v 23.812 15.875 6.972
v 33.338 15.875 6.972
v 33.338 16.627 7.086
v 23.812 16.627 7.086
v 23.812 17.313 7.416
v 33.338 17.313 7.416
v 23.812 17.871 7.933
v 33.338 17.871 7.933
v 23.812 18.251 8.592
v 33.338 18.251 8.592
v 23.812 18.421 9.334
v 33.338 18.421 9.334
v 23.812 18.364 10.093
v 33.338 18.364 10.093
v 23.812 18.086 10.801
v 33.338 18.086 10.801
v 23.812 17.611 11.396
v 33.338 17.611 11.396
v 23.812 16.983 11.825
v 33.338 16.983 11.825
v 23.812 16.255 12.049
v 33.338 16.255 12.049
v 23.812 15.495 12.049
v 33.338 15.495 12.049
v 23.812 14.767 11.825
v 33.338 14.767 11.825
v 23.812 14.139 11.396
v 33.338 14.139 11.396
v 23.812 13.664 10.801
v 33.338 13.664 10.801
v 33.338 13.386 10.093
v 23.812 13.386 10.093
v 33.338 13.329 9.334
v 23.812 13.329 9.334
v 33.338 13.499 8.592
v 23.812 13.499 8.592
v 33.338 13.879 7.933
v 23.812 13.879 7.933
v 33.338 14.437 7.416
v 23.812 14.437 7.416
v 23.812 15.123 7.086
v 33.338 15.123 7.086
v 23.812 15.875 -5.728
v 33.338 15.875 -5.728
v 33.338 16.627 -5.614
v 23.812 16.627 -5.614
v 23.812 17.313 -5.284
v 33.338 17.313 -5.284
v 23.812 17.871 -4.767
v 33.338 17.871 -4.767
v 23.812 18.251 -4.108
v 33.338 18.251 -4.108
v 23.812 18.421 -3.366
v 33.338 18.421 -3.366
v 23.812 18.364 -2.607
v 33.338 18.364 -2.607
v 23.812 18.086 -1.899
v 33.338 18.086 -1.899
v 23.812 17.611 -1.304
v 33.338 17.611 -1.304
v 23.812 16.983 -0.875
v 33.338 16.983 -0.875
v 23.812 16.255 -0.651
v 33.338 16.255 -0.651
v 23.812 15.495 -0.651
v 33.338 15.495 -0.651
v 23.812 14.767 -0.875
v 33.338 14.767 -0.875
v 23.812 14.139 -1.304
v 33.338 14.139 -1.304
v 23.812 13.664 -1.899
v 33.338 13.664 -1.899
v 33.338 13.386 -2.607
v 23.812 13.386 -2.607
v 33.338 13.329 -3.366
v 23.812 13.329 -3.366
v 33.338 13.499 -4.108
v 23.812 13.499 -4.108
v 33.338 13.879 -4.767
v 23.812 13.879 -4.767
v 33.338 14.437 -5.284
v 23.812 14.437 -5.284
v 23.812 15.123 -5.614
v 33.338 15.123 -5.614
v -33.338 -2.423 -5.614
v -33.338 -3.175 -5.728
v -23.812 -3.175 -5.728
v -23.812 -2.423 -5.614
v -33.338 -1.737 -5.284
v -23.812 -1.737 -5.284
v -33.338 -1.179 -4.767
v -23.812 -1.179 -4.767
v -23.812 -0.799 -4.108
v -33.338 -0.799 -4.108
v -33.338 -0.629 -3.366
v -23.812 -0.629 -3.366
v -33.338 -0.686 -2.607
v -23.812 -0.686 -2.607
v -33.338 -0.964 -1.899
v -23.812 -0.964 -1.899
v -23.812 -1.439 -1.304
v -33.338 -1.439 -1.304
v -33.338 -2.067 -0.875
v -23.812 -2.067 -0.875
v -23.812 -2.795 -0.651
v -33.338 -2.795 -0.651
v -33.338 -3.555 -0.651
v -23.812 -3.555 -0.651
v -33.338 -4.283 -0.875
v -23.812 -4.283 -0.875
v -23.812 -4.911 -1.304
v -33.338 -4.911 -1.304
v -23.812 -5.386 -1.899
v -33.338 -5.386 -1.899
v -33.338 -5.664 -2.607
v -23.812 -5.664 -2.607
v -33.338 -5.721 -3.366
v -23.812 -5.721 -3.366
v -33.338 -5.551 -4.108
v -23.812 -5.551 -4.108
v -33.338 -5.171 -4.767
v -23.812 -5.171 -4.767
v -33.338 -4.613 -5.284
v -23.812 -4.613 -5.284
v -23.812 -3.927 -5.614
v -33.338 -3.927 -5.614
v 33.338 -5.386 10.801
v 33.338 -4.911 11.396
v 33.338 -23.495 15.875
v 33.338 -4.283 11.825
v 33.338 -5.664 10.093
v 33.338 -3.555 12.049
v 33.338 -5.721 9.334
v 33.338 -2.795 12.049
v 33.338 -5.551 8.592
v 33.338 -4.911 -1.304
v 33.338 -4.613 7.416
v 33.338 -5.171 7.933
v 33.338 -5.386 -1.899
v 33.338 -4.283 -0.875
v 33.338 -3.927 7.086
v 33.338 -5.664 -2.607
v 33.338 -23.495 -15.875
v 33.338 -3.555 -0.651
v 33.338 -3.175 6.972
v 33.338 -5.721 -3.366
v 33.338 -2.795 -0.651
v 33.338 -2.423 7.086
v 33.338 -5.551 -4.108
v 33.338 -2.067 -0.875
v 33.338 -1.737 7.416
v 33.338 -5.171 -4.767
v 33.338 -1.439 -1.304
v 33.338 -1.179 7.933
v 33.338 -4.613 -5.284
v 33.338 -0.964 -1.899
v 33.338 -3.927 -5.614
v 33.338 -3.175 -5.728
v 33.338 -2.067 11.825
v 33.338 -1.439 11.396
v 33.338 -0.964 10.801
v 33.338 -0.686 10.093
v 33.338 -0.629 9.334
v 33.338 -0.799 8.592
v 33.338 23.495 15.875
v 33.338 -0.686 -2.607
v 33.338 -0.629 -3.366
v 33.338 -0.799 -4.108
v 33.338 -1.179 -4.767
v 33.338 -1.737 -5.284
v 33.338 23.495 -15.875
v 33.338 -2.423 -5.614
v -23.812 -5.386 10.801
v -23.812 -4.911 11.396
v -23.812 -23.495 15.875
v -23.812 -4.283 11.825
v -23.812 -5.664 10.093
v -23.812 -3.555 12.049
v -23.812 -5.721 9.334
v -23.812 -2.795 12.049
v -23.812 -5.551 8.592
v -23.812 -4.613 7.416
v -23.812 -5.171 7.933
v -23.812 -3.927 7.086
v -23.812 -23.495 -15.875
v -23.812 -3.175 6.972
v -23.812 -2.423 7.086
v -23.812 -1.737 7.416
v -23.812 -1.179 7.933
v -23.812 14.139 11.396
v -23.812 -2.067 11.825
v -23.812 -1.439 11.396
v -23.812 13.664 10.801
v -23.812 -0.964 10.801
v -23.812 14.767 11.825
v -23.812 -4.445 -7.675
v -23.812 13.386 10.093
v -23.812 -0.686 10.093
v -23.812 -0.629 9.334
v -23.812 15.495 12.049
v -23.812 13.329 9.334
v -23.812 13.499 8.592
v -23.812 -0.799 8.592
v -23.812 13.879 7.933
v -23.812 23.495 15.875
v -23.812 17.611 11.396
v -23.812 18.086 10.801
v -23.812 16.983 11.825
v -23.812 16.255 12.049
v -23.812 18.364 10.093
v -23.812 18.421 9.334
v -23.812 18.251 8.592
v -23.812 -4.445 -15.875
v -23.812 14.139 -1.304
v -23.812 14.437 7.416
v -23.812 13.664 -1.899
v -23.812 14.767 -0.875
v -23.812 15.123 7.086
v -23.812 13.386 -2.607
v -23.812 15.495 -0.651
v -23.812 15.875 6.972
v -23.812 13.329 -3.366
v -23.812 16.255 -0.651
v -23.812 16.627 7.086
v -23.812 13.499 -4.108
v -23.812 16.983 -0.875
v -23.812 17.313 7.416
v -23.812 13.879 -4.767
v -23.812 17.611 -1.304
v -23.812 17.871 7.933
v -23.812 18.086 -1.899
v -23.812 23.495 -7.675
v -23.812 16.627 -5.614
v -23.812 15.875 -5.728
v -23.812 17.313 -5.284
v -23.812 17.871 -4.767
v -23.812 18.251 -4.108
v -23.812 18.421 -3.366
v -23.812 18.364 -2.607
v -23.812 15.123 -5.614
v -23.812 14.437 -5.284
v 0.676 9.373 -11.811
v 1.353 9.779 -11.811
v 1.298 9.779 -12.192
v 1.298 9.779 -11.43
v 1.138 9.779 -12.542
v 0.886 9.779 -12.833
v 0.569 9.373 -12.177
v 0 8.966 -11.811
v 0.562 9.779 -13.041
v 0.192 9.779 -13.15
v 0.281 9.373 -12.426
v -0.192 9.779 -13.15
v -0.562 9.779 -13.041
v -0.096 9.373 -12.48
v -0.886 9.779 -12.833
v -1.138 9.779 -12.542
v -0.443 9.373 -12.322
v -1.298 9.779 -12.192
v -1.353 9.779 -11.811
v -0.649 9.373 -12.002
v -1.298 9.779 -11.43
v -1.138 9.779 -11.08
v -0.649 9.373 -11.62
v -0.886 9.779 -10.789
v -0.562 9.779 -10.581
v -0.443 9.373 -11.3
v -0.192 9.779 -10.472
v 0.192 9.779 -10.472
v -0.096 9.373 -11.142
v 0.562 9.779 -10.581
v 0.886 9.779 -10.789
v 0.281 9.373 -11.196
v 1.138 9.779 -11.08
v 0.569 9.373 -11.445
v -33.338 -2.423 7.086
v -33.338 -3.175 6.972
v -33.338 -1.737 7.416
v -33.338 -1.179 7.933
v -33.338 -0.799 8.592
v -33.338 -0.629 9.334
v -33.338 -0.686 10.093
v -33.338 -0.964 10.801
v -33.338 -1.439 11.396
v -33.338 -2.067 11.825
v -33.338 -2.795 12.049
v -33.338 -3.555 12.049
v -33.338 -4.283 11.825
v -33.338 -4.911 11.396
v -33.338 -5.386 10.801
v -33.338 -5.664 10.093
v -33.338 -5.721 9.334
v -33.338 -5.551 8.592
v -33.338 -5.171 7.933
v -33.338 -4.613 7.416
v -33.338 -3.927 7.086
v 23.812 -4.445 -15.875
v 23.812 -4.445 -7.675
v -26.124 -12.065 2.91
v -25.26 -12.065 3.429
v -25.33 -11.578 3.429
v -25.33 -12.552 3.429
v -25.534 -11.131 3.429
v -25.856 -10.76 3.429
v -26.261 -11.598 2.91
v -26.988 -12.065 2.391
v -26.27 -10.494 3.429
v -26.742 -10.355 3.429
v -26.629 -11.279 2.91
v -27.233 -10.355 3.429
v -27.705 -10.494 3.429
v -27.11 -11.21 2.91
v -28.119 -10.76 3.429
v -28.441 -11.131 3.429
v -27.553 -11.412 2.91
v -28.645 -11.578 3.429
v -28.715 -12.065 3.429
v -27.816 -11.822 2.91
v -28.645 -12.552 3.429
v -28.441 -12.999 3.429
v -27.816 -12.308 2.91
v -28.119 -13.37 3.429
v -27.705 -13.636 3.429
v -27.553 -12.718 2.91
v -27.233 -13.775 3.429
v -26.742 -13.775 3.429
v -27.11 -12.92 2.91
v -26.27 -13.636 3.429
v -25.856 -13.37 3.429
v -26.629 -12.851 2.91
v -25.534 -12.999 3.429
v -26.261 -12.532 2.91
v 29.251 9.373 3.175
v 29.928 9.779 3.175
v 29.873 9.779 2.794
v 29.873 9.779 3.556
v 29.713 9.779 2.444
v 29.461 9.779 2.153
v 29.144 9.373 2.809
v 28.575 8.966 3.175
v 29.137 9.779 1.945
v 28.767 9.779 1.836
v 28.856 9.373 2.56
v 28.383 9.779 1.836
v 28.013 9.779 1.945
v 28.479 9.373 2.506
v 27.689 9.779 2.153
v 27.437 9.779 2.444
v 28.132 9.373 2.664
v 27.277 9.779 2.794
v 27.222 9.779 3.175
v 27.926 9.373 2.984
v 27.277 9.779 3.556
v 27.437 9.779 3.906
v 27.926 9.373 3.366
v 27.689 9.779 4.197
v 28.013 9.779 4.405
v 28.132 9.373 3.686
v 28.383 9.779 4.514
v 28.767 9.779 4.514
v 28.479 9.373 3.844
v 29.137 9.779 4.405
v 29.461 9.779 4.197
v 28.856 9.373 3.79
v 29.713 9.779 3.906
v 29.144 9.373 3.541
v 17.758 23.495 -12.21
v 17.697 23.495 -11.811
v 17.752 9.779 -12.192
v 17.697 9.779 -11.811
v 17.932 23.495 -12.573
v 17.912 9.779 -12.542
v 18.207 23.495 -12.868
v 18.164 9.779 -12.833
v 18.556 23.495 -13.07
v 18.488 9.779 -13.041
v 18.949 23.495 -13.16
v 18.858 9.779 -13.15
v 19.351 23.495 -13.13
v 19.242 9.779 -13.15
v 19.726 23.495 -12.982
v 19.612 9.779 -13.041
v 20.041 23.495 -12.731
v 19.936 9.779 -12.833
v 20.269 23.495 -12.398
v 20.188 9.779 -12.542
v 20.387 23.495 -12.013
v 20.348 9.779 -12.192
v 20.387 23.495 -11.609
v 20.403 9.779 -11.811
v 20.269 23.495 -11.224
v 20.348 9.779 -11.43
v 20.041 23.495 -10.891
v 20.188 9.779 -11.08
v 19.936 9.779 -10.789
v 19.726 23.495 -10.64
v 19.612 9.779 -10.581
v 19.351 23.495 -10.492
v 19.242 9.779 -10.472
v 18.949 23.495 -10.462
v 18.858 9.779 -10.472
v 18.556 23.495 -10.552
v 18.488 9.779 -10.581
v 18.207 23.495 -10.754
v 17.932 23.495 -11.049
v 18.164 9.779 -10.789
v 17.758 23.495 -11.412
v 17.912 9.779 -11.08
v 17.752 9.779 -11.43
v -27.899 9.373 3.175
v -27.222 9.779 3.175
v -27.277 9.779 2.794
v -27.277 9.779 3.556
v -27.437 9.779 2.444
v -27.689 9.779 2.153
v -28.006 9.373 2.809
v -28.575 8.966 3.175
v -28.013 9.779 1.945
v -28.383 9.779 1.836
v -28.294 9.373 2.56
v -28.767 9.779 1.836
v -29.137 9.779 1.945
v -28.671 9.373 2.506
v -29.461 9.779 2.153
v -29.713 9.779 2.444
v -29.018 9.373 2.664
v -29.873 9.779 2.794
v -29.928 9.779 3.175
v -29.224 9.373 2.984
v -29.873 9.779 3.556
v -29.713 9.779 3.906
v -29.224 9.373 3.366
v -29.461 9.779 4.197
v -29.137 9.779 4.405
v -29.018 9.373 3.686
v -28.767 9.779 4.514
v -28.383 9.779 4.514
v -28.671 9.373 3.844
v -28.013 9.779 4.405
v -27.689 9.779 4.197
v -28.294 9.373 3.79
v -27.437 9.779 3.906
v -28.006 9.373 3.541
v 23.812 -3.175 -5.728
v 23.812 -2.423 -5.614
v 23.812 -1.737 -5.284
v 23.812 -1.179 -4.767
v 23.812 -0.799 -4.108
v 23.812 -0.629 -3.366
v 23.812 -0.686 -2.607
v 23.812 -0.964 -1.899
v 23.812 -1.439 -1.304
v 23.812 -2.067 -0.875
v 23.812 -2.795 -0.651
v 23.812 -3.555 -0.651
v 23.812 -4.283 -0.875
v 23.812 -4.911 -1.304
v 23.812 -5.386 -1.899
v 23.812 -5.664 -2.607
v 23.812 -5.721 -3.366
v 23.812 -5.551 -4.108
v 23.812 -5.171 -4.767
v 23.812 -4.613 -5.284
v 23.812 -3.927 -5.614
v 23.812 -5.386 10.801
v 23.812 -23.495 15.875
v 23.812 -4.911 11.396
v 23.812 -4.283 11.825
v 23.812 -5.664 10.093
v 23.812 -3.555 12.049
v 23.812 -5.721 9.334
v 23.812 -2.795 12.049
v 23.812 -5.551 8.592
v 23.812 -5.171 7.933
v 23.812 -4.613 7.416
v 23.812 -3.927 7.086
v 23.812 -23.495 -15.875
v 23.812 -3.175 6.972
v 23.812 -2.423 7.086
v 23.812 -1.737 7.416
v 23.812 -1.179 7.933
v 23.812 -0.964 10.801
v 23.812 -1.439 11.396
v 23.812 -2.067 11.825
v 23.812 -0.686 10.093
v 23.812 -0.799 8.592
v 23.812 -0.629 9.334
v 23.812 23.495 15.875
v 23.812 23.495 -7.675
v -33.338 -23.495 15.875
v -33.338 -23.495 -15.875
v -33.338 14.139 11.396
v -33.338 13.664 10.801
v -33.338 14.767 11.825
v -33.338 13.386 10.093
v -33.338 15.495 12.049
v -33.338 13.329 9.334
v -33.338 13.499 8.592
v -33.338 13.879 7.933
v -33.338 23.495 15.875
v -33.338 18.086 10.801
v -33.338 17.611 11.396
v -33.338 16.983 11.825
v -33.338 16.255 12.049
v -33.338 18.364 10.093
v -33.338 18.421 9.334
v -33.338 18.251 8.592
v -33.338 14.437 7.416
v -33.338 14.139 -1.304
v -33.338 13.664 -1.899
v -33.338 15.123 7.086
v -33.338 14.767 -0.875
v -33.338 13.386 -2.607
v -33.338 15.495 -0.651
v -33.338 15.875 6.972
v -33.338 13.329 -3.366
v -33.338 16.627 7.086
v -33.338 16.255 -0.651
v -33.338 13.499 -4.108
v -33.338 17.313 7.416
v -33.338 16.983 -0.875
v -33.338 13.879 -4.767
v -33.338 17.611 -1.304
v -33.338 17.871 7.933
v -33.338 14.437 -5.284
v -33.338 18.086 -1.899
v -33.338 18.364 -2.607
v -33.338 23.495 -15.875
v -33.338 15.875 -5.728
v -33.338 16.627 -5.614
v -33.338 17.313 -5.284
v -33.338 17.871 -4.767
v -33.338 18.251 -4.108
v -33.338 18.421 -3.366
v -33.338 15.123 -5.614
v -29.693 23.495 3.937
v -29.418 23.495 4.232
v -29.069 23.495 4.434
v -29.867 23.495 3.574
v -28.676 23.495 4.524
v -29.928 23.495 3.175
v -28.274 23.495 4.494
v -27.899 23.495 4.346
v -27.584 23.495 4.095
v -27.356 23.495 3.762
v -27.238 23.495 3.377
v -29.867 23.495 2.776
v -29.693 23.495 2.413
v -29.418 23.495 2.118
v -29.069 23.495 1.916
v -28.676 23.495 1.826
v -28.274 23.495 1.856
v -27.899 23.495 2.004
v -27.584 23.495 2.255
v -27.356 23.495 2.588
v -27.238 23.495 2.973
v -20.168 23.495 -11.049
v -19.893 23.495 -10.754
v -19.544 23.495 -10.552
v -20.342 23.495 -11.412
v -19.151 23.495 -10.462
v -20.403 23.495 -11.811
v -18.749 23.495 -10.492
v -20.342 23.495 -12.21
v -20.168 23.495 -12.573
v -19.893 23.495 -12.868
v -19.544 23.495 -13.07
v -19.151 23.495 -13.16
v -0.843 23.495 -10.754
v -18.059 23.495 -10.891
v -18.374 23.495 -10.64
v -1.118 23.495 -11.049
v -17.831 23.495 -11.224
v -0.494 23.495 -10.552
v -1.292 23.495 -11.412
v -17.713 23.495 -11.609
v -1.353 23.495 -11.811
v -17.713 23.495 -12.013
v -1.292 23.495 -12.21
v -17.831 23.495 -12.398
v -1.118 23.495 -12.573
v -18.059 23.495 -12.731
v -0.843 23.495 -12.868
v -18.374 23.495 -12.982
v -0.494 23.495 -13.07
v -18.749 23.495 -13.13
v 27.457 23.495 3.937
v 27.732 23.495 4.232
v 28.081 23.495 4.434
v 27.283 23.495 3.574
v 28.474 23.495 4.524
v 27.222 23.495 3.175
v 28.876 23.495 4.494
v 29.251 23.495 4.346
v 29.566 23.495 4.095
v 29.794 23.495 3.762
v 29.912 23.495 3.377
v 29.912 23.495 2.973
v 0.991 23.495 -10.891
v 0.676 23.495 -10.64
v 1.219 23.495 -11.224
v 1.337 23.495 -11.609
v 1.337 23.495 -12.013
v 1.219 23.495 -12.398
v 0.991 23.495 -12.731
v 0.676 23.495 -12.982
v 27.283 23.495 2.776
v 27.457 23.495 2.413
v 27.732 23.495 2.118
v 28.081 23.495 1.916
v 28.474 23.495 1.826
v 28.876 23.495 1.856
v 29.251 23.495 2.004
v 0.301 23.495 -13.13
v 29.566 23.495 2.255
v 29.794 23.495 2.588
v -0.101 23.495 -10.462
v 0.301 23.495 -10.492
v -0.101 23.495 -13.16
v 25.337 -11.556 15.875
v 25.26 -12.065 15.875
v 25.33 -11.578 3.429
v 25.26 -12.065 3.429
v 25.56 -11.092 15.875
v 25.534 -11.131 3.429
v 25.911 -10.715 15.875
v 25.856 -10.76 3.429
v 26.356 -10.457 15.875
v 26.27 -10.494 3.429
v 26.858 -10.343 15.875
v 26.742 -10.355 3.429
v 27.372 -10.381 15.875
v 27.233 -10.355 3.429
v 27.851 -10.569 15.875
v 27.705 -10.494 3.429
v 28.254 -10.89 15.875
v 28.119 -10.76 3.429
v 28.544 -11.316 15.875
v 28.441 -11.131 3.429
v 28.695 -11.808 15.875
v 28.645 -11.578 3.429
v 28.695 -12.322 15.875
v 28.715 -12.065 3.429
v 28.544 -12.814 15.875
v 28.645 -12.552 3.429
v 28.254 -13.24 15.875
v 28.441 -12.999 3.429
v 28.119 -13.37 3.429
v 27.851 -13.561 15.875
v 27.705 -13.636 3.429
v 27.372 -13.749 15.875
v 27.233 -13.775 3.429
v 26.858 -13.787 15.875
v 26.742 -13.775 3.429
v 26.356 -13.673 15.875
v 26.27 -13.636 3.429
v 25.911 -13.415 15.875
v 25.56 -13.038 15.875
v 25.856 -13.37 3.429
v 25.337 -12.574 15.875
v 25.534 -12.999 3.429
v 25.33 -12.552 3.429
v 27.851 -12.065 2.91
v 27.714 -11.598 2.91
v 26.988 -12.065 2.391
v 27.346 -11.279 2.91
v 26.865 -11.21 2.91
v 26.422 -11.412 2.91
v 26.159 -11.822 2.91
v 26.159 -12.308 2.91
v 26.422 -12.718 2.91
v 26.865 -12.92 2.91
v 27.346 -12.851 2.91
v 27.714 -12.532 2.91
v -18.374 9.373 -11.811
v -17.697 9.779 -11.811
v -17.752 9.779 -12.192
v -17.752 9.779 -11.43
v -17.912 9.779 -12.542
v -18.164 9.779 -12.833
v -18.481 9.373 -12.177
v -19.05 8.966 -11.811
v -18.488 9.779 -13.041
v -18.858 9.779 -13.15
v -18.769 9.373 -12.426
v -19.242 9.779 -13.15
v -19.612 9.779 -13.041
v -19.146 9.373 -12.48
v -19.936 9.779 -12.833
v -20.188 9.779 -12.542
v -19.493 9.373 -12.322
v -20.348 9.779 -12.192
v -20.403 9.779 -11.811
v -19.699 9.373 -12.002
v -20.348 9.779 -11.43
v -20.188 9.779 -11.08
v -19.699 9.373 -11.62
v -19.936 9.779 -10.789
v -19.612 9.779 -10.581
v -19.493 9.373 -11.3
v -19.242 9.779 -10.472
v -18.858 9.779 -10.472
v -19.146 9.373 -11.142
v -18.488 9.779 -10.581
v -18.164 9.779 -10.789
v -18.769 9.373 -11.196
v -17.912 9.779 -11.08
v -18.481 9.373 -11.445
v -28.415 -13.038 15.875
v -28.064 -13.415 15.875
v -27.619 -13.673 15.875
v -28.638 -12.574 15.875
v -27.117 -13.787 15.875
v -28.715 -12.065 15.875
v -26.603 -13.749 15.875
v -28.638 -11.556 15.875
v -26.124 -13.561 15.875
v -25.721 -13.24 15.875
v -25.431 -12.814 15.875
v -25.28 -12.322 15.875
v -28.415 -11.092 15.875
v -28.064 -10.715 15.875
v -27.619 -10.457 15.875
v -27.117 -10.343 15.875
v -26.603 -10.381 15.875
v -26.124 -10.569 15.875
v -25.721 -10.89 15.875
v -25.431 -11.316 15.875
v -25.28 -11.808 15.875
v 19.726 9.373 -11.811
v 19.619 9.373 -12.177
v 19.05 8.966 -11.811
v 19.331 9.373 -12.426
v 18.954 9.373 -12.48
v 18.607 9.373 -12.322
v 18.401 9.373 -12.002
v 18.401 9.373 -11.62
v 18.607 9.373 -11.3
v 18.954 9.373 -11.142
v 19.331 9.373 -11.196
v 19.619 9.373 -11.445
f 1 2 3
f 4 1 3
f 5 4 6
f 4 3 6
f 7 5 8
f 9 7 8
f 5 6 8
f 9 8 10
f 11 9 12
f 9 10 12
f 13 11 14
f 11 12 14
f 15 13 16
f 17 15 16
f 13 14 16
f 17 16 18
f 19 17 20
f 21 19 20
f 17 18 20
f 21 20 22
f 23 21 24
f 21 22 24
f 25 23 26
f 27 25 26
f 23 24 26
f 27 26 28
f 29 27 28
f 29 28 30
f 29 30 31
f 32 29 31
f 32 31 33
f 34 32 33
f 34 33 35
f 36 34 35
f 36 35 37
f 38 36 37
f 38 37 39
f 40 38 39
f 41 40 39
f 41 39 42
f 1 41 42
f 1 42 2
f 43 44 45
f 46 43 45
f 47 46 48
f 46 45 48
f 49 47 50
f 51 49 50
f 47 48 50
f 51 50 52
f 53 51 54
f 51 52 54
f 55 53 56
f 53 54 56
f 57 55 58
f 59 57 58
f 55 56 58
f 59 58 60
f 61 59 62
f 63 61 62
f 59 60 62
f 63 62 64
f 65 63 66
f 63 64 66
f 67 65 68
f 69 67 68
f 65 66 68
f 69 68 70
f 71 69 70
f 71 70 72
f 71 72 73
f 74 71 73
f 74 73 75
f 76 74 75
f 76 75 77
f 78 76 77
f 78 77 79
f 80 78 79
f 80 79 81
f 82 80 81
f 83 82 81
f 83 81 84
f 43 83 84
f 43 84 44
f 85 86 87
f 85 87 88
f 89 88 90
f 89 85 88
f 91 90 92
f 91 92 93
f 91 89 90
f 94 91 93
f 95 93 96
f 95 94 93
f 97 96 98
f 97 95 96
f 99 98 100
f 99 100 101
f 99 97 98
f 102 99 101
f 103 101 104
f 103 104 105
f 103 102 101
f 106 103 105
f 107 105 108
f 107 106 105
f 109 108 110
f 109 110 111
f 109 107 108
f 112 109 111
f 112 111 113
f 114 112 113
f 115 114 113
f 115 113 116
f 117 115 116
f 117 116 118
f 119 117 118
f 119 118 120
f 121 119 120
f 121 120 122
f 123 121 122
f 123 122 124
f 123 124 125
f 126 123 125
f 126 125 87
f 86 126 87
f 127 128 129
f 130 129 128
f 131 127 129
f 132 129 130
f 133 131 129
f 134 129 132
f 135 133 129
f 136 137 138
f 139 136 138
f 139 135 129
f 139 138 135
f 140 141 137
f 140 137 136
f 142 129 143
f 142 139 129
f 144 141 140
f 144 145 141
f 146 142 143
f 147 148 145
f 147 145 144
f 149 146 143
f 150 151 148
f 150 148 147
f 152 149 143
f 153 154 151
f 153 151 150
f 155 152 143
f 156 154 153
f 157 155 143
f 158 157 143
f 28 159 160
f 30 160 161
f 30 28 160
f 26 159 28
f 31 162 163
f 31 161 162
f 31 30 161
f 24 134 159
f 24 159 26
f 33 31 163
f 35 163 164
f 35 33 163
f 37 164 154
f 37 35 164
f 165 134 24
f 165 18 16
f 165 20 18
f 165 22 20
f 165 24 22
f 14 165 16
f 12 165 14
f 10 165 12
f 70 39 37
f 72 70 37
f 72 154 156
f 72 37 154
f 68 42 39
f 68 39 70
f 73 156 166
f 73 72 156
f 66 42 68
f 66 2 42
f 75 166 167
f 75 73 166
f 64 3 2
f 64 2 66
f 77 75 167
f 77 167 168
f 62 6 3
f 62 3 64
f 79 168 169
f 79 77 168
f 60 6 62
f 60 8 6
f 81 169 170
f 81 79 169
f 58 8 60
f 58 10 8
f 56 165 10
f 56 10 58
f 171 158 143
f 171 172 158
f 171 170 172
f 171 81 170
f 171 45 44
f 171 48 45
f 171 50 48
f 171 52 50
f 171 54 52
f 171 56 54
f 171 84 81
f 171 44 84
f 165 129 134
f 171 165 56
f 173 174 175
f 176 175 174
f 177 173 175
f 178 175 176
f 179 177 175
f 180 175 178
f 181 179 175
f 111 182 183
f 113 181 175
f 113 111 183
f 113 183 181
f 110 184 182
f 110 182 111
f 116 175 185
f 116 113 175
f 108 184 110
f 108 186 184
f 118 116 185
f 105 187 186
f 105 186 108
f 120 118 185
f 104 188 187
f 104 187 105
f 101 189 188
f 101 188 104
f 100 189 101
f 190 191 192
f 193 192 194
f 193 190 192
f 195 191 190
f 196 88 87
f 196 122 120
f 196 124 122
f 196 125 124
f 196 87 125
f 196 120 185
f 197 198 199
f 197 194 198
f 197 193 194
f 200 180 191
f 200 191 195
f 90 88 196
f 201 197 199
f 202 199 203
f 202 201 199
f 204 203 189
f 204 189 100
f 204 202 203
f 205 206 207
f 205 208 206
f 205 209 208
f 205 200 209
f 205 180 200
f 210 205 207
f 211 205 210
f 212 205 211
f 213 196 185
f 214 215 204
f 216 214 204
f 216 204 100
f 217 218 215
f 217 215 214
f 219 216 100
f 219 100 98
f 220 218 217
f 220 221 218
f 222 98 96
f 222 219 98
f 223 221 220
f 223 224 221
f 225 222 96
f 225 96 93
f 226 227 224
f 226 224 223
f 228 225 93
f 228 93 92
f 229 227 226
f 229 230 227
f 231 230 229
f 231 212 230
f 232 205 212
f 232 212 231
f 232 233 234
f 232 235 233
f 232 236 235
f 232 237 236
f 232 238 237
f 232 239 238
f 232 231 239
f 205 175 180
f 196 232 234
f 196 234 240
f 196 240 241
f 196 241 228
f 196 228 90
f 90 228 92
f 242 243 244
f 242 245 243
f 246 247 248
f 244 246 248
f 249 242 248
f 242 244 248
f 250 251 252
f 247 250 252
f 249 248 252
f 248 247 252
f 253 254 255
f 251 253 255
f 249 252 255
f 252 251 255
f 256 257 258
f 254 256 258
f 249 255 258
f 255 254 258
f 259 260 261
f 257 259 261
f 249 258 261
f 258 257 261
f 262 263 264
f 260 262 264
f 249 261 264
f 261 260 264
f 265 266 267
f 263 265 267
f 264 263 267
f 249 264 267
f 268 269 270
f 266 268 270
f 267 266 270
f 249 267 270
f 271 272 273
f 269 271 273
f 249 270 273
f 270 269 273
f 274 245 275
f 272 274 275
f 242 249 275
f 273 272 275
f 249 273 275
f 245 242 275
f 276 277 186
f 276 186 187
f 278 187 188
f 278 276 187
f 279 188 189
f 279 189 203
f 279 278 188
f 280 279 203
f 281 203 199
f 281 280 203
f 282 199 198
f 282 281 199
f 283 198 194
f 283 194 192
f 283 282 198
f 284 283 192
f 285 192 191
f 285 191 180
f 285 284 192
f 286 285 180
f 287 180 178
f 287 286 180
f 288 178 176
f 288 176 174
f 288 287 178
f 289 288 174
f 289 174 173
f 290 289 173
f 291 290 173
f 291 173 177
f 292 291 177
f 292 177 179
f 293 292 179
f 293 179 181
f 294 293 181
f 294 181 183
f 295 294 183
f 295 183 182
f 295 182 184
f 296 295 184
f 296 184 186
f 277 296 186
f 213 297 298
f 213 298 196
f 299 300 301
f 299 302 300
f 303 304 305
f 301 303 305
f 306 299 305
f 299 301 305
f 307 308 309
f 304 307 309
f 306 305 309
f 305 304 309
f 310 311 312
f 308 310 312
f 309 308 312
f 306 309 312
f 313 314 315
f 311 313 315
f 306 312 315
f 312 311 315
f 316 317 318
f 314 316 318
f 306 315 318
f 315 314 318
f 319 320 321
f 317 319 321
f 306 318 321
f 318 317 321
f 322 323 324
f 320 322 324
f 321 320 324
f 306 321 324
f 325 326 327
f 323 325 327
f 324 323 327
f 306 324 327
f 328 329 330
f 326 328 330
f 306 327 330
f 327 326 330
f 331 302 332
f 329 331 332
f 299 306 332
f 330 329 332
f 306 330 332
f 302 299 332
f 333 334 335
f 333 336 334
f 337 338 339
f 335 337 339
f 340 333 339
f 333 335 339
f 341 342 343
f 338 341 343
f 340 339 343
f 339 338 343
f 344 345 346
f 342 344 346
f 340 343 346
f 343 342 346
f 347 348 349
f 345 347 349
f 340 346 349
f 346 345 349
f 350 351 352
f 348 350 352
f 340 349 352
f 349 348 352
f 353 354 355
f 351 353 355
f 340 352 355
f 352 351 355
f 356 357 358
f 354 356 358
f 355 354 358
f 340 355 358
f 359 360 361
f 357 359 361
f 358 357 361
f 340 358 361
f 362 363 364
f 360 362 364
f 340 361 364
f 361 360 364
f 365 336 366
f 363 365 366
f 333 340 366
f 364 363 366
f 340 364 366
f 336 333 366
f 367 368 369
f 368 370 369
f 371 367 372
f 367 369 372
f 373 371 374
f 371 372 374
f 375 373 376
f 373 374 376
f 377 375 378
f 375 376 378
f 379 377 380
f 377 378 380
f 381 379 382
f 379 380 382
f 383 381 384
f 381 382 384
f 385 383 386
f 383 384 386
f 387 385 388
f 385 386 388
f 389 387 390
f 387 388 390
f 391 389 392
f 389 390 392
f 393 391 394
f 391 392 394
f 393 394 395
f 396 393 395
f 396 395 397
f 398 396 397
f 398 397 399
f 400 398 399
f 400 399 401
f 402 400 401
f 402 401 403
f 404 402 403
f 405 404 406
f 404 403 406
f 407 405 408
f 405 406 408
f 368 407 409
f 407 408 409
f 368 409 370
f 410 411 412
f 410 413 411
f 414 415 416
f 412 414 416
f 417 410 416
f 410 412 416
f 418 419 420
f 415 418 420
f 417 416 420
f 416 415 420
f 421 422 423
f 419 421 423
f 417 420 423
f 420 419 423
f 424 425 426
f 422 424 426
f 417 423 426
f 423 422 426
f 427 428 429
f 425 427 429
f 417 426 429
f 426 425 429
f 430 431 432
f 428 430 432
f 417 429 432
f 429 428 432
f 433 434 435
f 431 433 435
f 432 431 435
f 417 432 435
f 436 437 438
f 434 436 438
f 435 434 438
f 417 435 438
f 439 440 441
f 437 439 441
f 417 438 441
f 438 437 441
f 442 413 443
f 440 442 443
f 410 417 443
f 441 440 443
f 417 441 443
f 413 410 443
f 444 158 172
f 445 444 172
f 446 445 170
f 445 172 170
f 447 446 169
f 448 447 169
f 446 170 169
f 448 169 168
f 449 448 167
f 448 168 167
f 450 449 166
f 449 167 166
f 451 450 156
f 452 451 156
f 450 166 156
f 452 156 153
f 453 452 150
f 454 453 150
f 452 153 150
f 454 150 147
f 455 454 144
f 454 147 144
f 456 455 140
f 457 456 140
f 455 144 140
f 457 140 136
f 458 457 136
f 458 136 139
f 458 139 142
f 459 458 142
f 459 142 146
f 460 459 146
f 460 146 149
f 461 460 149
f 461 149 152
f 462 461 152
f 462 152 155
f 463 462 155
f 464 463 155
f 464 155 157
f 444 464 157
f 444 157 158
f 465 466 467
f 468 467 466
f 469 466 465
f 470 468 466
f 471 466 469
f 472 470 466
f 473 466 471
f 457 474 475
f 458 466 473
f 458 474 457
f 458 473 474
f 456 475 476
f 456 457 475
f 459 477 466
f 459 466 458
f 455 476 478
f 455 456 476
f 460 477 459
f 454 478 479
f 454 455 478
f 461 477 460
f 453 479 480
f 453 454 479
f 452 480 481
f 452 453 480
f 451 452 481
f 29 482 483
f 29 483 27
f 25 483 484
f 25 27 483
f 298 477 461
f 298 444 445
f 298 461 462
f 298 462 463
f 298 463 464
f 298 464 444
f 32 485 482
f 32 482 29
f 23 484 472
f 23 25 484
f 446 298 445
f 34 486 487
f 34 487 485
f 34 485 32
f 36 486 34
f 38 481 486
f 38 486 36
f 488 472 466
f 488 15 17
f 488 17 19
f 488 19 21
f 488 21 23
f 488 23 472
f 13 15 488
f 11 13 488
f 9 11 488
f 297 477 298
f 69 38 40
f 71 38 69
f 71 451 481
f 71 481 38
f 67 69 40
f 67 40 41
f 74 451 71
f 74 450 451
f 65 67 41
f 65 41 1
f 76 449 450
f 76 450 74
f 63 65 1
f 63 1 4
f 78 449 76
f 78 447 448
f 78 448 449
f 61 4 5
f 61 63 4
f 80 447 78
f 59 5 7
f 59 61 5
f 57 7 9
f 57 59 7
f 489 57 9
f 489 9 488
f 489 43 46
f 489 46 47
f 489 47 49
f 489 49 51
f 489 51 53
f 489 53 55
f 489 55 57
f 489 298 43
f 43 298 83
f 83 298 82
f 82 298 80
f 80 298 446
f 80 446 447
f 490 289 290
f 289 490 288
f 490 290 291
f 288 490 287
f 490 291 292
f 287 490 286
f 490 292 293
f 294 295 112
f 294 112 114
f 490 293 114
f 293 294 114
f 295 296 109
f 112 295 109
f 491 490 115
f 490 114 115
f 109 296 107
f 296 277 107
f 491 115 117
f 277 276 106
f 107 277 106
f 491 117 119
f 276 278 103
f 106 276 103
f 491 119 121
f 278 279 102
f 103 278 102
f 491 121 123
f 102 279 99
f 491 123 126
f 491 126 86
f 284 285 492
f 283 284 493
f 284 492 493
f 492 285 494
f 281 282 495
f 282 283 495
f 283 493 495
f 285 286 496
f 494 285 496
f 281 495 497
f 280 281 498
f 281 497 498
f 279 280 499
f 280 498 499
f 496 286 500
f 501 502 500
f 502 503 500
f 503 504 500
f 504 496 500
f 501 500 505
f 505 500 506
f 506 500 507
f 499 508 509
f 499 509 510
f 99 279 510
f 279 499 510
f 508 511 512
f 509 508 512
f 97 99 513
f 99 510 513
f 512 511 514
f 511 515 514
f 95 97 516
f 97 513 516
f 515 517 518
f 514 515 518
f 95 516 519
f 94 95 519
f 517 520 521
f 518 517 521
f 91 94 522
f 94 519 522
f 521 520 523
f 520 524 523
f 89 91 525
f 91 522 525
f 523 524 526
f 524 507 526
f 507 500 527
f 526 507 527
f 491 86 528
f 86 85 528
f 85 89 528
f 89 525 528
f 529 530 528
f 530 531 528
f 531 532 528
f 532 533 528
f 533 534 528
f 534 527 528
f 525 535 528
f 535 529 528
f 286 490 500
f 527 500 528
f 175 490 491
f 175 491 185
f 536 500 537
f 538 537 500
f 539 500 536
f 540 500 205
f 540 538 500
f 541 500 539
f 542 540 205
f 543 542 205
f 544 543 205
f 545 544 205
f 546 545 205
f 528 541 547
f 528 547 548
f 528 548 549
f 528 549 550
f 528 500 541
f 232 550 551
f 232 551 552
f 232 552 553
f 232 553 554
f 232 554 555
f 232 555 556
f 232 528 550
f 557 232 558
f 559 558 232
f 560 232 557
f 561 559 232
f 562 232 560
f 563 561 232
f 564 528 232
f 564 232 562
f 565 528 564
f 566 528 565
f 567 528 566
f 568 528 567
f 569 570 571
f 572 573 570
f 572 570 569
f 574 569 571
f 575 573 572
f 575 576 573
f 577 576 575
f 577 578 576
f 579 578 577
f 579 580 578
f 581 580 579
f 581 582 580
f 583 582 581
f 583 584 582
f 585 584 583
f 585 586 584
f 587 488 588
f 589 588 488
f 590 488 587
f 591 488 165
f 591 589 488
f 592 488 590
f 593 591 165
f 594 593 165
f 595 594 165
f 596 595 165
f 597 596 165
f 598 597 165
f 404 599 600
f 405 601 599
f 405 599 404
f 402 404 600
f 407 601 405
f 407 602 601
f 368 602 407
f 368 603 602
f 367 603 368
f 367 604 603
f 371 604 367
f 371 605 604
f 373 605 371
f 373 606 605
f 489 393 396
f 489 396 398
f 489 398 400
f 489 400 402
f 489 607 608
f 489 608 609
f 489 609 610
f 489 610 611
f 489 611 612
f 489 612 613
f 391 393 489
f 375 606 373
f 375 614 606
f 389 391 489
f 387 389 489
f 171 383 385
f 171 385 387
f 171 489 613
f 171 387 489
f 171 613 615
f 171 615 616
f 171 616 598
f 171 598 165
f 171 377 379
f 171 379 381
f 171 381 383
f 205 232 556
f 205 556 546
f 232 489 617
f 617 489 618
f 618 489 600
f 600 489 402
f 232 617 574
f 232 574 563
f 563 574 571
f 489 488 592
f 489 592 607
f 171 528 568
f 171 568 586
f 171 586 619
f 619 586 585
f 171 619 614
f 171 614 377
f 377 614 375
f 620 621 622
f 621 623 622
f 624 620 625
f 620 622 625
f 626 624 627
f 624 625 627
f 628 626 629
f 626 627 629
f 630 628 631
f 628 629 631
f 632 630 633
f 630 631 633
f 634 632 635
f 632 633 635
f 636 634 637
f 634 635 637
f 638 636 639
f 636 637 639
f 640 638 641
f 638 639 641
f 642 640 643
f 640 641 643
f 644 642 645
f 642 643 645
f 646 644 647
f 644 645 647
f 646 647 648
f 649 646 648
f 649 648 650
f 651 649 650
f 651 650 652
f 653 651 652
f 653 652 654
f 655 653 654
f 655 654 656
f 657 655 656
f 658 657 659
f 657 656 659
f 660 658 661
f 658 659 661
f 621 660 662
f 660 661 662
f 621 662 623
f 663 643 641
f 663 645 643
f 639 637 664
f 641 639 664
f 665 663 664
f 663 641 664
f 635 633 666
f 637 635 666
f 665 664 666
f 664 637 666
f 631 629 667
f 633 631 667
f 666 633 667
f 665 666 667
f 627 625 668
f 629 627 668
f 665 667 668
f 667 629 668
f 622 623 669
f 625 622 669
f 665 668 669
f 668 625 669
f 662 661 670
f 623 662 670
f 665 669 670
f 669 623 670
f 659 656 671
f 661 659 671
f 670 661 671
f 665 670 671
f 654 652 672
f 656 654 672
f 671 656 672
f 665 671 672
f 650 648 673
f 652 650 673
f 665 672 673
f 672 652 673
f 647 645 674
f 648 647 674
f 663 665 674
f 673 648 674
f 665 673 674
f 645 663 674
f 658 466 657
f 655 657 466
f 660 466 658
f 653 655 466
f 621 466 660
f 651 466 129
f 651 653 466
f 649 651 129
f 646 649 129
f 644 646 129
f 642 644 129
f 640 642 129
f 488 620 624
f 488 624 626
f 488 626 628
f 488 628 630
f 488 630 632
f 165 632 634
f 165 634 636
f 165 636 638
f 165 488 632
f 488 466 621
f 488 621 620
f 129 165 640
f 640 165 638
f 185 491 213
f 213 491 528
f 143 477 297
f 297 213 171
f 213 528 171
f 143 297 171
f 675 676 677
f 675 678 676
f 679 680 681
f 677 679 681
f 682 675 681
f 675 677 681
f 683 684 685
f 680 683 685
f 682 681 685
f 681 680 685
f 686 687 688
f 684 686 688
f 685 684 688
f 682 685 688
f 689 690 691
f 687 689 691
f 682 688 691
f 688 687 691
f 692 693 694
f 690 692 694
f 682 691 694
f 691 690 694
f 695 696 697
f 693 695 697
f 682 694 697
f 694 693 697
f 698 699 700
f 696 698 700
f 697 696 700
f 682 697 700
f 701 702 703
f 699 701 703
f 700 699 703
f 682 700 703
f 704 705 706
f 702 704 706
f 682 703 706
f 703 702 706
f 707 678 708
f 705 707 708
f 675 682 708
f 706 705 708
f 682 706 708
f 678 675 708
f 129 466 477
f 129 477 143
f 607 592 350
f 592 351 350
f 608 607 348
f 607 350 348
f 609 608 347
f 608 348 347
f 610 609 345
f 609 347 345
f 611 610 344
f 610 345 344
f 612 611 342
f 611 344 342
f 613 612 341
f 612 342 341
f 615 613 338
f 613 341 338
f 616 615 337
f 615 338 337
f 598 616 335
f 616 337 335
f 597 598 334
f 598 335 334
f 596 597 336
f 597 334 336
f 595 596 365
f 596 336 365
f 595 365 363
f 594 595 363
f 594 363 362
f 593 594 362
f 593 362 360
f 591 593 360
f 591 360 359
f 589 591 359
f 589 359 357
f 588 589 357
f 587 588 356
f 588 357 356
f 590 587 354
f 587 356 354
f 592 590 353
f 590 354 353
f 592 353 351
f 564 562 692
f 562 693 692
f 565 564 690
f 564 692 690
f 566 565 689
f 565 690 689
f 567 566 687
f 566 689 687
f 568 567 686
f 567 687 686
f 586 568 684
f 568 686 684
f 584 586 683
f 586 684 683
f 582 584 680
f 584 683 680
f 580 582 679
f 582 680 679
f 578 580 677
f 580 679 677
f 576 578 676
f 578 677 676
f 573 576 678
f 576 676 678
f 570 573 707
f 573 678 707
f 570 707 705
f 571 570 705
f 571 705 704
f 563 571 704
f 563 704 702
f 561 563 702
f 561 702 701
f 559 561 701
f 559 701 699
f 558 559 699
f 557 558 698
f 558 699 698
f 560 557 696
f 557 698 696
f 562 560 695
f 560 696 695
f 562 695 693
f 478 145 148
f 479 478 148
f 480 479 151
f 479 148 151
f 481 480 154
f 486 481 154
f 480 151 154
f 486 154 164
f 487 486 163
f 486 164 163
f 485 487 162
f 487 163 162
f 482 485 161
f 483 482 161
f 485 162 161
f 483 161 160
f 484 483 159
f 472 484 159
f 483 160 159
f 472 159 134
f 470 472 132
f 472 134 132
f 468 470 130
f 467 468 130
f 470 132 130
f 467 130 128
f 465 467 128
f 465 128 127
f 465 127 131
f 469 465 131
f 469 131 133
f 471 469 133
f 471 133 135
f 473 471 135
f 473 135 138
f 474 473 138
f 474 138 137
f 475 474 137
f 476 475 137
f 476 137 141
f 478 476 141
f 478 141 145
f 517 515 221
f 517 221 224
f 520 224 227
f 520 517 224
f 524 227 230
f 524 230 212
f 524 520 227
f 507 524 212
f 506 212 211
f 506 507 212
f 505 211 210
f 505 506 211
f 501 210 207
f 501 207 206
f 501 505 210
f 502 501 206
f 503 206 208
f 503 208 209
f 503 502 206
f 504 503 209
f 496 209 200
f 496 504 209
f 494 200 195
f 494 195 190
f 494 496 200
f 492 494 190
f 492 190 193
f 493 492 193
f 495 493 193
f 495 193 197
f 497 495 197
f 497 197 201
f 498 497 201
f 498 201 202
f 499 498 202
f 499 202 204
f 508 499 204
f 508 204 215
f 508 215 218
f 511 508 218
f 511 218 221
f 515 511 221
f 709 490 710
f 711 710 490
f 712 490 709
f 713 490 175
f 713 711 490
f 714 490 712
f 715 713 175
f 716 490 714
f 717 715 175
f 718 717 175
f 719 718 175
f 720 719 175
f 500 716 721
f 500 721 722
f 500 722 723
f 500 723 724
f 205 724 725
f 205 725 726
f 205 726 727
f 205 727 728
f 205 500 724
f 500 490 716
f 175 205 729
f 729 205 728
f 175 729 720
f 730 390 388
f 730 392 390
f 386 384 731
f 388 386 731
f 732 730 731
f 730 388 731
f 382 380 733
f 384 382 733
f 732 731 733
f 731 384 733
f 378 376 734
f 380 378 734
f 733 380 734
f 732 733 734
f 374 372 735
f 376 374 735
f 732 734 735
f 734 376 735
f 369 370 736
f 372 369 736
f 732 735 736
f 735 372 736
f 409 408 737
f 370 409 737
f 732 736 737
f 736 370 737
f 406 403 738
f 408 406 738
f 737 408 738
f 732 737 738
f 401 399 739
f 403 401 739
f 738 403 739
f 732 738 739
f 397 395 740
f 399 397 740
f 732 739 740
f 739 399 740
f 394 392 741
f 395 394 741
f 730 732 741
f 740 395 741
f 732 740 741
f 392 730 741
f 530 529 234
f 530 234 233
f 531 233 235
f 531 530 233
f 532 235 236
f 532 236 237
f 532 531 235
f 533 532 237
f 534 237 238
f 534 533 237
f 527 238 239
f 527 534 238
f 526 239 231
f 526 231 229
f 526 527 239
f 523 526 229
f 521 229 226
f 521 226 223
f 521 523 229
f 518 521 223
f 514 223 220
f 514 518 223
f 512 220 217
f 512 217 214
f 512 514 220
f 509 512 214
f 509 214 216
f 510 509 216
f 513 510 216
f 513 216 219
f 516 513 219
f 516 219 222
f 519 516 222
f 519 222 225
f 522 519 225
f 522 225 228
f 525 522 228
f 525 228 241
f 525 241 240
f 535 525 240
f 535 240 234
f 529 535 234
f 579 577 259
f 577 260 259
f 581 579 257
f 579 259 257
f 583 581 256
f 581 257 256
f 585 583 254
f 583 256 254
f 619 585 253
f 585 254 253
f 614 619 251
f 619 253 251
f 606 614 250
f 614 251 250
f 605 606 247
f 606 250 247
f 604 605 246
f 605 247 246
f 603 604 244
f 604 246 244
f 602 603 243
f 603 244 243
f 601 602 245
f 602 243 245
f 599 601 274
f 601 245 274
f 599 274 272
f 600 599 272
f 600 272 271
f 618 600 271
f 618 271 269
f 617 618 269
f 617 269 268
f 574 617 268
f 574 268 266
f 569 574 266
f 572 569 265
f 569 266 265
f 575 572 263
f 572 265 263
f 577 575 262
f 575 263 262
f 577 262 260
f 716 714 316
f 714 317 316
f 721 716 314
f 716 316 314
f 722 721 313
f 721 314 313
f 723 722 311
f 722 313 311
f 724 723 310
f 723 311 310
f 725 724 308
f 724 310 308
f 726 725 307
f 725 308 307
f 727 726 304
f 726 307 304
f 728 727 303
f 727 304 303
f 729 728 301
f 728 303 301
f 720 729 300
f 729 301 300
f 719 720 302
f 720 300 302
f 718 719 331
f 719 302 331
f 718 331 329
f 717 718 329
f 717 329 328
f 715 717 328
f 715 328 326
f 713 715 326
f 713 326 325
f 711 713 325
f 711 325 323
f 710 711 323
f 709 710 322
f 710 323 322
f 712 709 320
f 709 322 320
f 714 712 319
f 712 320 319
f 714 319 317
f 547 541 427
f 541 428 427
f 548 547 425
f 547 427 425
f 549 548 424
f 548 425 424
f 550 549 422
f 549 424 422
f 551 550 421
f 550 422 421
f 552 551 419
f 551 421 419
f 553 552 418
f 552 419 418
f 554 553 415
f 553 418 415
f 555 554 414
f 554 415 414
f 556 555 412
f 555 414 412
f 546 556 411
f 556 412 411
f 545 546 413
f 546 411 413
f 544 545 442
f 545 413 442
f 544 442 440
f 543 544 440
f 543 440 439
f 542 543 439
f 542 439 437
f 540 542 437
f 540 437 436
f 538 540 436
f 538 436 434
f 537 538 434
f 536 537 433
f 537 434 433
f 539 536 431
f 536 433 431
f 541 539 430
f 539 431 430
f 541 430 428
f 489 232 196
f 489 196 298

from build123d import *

# Parameters (mm, degrees)
SKETCH1_W                    = 66.675
SKETCH1_H                    = 31.75
BOSS_EXTRUDE1_DEPTH          = 23.495
CUT_EXTRUDE1_REACH           = 61.762
SKETCH2_W                    = 47.625
SKETCH2_H                    = 23.550328578
CUT_EXTRUDE2_REACH           = 53.686
SKETCH3_W                    = 47.625
SKETCH3_H                    = 19.05
F_1_4_20_TAPPED_HOLE1_REACH  = 74.454
F_1_4_20_TAPPED_HOLE1_BORE_R = 2.5527
F_8_32_TAPPED_HOLE1_D        = 3.4544
F_8_32_TAPPED_HOLE1_DEPTH    = 12.446
F_8_32_TAPPED_HOLE1_TIP      = 1.037806461
F_6_32_TAPPED_HOLE1_D        = 2.7051
F_6_32_TAPPED_HOLE1_DEPTH    = 13.716
F_6_32_TAPPED_HOLE1_TIP      = 0.81269403


with BuildPart() as part:
    # Sketch1 → Boss-Extrude1 (new, symmetric)
    with BuildSketch(Plane(origin=(0, 0, 0), x_dir=(1, 0, 0), z_dir=(0, 1, 0))):
        Rectangle(SKETCH1_W, SKETCH1_H)
    extrude(amount=BOSS_EXTRUDE1_DEPTH, both=True)

    # Sketch2 → Cut-Extrude1 (cut, up to next)
    with BuildSketch(Plane(origin=(0, 23.495, 0), x_dir=(1, 0, 0), z_dir=(0, 1, 0)), mode=Mode.PRIVATE) as cut_extrude1_sk1:
        with Locations((0, -4.099835711)):
            Rectangle(SKETCH2_W, SKETCH2_H)
    cut_extrude1_tool1 = extrude(cut_extrude1_sk1.sketch, amount=-CUT_EXTRUDE1_REACH, mode=Mode.PRIVATE) & part.part
    add(cut_extrude1_tool1.solids().sort_by_distance((0, 23.495, 4.099836))[0], mode=Mode.SUBTRACT)

    # Sketch3 → Cut-Extrude2 (cut, up to next)
    with BuildSketch(Plane(origin=(0, 0, -15.875), x_dir=(-1, 0, 0), z_dir=(0, 0, -1)), mode=Mode.PRIVATE) as cut_extrude2_sk1:
        with Locations((0, -13.97)):
            Rectangle(SKETCH3_W, SKETCH3_H)
    cut_extrude2_tool1 = extrude(cut_extrude2_sk1.sketch, amount=-CUT_EXTRUDE2_REACH, mode=Mode.PRIVATE) & part.part
    add(cut_extrude2_tool1.solids().sort_by_distance((0, -13.97, -15.875))[0], mode=Mode.SUBTRACT)

    # 1/4-20 Tapped Hole1 bore → 1/4-20 Tapped Hole1 (cut, up to next)
    with BuildSketch(Plane(origin=(33.3375, 0, 0), x_dir=(0, 0, -1), z_dir=(1, 0, 0)), mode=Mode.PRIVATE) as f_1_4_20_tapped_hole1_sk1:
        with Locations((-9.525, 15.875)):
            Circle(F_1_4_20_TAPPED_HOLE1_BORE_R)
    f_1_4_20_tapped_hole1_tool1 = extrude(f_1_4_20_tapped_hole1_sk1.sketch, amount=-F_1_4_20_TAPPED_HOLE1_REACH, mode=Mode.PRIVATE) & part.part
    # 1/4-20 Tapped Hole1 bore → 1/4-20 Tapped Hole1 (cut, up to next)
    with BuildSketch(Plane(origin=(33.3375, 0, 0), x_dir=(0, 0, -1), z_dir=(1, 0, 0)), mode=Mode.PRIVATE) as f_1_4_20_tapped_hole1_sk2:
        with Locations((3.175, 15.875)):
            Circle(F_1_4_20_TAPPED_HOLE1_BORE_R)
    f_1_4_20_tapped_hole1_tool2 = extrude(f_1_4_20_tapped_hole1_sk2.sketch, amount=-F_1_4_20_TAPPED_HOLE1_REACH, mode=Mode.PRIVATE) & part.part
    # 1/4-20 Tapped Hole1 bore → 1/4-20 Tapped Hole1 (cut, up to next)
    with BuildSketch(Plane(origin=(33.3375, 0, 0), x_dir=(0, 0, -1), z_dir=(1, 0, 0)), mode=Mode.PRIVATE) as f_1_4_20_tapped_hole1_sk3:
        with Locations((3.175, -3.175)):
            Circle(F_1_4_20_TAPPED_HOLE1_BORE_R)
    f_1_4_20_tapped_hole1_tool3 = extrude(f_1_4_20_tapped_hole1_sk3.sketch, amount=-F_1_4_20_TAPPED_HOLE1_REACH, mode=Mode.PRIVATE) & part.part
    # 1/4-20 Tapped Hole1 bore → 1/4-20 Tapped Hole1 (cut, up to next)
    with BuildSketch(Plane(origin=(33.3375, 0, 0), x_dir=(0, 0, -1), z_dir=(1, 0, 0)), mode=Mode.PRIVATE) as f_1_4_20_tapped_hole1_sk4:
        with Locations((-9.525, -3.175)):
            Circle(F_1_4_20_TAPPED_HOLE1_BORE_R)
    f_1_4_20_tapped_hole1_tool4 = extrude(f_1_4_20_tapped_hole1_sk4.sketch, amount=-F_1_4_20_TAPPED_HOLE1_REACH, mode=Mode.PRIVATE) & part.part
    f_1_4_20_tapped_hole1_1 = f_1_4_20_tapped_hole1_tool1.solids().sort_by_distance((33.3375, 15.875, 9.525))[0]
    add(f_1_4_20_tapped_hole1_1, mode=Mode.SUBTRACT)
    f_1_4_20_tapped_hole1_2 = f_1_4_20_tapped_hole1_tool2.solids().sort_by_distance((33.3375, 15.875, -3.175))[0]
    add(f_1_4_20_tapped_hole1_2, mode=Mode.SUBTRACT)
    f_1_4_20_tapped_hole1_3 = f_1_4_20_tapped_hole1_tool3.solids().sort_by_distance((33.3375, -3.175, -3.175))[0]
    add(f_1_4_20_tapped_hole1_3, mode=Mode.SUBTRACT)
    f_1_4_20_tapped_hole1_4 = f_1_4_20_tapped_hole1_tool4.solids().sort_by_distance((33.3375, -3.175, 9.525))[0]
    add(f_1_4_20_tapped_hole1_4, mode=Mode.SUBTRACT)
    f_1_4_20_tapped_hole1 = f_1_4_20_tapped_hole1_1 + f_1_4_20_tapped_hole1_2 + f_1_4_20_tapped_hole1_3 + f_1_4_20_tapped_hole1_4  # 1/4-20 Tapped Hole1 as one shape, for the pattern or mirror that repeats it

    # Mirror1: 1/4-20 Tapped Hole1 across plane
    add(f_1_4_20_tapped_hole1.mirror(Plane(origin=(0, 0, 0), x_dir=(0, 0, 1), z_dir=(1, 0, 0))), mode=Mode.SUBTRACT)

    # #8-32 Tapped Hole1
    with Locations(Plane.XY.offset(15.875)):
        with Locations((-26.9875, -12.065), (26.9875, -12.065)):
            Hole(F_8_32_TAPPED_HOLE1_D / 2, depth=F_8_32_TAPPED_HOLE1_DEPTH)
            with Locations((0, 0, -(F_8_32_TAPPED_HOLE1_DEPTH + F_8_32_TAPPED_HOLE1_TIP / 2))):  # 118° drill point
                Cone(0, F_8_32_TAPPED_HOLE1_D / 2, F_8_32_TAPPED_HOLE1_TIP, mode=Mode.SUBTRACT)

    # #6-32 Tapped Hole1
    with Locations(Plane(origin=(0, 23.495, 0), x_dir=(1, 0, 0), z_dir=(0, 1, 0))):
        with Locations((0, 11.811), (19.05, 11.811), (-19.05, 11.811), (-28.575, -3.175), (28.575, -3.175)):
            Hole(F_6_32_TAPPED_HOLE1_D / 2, depth=F_6_32_TAPPED_HOLE1_DEPTH)
            with Locations((0, 0, -(F_6_32_TAPPED_HOLE1_DEPTH + F_6_32_TAPPED_HOLE1_TIP / 2))):  # 118° drill point
                Cone(0, F_6_32_TAPPED_HOLE1_D / 2, F_6_32_TAPPED_HOLE1_TIP, mode=Mode.SUBTRACT)


solid = part.part
